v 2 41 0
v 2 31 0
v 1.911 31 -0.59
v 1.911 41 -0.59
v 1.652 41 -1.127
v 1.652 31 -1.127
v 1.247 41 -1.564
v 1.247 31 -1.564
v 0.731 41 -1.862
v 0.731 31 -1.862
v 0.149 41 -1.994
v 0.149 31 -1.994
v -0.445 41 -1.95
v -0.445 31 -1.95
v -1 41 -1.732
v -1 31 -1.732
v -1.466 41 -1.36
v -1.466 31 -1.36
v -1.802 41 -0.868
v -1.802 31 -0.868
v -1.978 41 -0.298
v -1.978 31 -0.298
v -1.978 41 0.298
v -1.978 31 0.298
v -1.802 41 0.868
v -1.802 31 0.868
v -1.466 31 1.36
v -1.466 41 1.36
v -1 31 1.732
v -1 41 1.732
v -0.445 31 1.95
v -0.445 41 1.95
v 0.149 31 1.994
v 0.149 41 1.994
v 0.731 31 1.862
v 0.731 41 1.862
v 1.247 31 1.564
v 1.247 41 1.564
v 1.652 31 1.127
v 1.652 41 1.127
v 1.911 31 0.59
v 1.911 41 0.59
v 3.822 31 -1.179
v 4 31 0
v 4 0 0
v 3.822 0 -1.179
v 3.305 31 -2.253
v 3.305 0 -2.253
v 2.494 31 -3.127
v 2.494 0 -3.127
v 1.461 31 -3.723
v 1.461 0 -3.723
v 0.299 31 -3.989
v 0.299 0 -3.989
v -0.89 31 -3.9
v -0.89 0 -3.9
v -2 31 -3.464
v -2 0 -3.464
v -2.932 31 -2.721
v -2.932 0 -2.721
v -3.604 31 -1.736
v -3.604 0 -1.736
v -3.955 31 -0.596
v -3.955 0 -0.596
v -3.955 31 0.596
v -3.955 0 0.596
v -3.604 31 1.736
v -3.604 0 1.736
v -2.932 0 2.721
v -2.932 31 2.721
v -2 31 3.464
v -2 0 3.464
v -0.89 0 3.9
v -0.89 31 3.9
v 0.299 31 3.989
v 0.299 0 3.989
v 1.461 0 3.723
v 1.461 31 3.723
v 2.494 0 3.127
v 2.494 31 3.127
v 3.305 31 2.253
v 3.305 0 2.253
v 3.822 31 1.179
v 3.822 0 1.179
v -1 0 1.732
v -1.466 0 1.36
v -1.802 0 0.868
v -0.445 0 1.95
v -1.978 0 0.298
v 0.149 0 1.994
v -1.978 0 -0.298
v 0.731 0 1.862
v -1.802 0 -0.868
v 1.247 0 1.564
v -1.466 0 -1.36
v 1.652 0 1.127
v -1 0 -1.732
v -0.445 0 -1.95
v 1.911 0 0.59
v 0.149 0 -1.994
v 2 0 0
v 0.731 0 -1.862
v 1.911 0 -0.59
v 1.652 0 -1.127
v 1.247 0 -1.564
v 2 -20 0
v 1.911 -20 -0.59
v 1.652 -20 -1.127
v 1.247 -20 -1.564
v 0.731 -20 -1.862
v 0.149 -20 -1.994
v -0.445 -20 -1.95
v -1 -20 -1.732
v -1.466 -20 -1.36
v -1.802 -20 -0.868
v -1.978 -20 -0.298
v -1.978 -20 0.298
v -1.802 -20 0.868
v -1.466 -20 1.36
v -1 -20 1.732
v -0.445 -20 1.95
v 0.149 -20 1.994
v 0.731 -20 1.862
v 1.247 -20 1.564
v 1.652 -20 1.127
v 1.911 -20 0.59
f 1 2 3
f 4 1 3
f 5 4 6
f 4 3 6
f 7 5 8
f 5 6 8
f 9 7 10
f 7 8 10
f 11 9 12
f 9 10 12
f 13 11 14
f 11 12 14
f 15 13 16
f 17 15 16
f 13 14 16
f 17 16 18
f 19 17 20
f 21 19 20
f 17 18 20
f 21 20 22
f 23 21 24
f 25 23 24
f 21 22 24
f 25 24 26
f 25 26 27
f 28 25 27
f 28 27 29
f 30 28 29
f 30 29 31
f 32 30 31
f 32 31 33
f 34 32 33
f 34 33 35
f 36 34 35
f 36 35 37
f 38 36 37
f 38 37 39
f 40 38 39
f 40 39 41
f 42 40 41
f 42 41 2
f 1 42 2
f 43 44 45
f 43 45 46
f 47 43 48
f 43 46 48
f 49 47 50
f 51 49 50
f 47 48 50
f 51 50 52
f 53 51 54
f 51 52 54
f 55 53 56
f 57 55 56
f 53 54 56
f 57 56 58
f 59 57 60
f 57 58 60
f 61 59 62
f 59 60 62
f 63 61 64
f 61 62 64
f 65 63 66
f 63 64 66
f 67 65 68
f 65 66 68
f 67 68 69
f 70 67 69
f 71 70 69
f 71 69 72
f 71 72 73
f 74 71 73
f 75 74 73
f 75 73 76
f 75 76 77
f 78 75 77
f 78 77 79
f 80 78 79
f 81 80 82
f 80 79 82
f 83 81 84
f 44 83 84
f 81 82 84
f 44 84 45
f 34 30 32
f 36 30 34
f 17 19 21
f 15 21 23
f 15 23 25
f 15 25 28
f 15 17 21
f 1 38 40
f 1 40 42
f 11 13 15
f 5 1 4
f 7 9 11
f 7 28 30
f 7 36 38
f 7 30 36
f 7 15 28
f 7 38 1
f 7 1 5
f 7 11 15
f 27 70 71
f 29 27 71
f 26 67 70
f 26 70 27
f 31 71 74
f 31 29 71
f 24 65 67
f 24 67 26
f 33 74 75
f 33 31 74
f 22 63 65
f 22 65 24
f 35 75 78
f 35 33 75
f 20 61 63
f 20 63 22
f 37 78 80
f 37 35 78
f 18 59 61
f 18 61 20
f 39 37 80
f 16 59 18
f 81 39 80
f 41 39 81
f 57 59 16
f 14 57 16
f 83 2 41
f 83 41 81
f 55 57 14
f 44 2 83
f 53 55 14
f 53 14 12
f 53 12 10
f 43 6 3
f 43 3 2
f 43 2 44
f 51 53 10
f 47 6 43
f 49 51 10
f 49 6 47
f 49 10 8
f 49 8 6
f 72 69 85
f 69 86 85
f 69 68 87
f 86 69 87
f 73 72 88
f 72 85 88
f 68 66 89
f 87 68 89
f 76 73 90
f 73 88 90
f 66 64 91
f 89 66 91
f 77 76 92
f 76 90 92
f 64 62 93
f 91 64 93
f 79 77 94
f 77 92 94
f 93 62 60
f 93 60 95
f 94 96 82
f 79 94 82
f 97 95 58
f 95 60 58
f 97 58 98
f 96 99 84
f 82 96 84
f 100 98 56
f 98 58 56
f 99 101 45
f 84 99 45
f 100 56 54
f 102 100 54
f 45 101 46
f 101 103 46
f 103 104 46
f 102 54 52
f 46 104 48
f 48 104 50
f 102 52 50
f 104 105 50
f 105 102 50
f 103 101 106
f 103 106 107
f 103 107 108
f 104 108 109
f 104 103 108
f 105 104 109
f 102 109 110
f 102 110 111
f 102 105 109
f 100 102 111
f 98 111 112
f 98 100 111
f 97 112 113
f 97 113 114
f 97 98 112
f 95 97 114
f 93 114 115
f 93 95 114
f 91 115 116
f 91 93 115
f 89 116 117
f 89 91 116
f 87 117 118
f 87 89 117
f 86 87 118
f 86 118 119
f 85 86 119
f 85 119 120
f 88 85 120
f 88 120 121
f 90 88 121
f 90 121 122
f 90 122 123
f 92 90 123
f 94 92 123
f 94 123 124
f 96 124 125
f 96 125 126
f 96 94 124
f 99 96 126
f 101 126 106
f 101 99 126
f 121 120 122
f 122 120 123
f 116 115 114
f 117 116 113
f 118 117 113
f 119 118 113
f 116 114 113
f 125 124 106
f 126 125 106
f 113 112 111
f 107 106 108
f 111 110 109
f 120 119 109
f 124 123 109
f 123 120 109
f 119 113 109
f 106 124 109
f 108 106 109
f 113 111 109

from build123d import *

# Parameters (mm, degrees)
SKETCH1_R                = 4
BOSS_EXTRUDE1_DEPTH      = 31
BOSS_EXTRUDE2_DEPTH      = 41
BOSS_EXTRUDE2_DEPTH_BACK = 20
SKETCH1_4_R              = 2


with BuildPart() as part:
    # Sketch1 → Boss-Extrude1 (new body)
    with BuildSketch(Plane(origin=(0, 0, 0), x_dir=(1, 0, 0), z_dir=(0, 1, 0))):
        Circle(SKETCH1_R)
    extrude(amount=BOSS_EXTRUDE1_DEPTH)

    # Sketch1<4> → Boss-Extrude2 (add, two sides: drawn at the far end of the back side and taken through both)
    with BuildSketch(Plane(origin=(0, 0, 0), x_dir=(1, 0, 0), z_dir=(0, 1, 0)).offset(-BOSS_EXTRUDE2_DEPTH_BACK)):
        Circle(SKETCH1_4_R)
    extrude(amount=BOSS_EXTRUDE2_DEPTH + BOSS_EXTRUDE2_DEPTH_BACK)


solid = part.part
